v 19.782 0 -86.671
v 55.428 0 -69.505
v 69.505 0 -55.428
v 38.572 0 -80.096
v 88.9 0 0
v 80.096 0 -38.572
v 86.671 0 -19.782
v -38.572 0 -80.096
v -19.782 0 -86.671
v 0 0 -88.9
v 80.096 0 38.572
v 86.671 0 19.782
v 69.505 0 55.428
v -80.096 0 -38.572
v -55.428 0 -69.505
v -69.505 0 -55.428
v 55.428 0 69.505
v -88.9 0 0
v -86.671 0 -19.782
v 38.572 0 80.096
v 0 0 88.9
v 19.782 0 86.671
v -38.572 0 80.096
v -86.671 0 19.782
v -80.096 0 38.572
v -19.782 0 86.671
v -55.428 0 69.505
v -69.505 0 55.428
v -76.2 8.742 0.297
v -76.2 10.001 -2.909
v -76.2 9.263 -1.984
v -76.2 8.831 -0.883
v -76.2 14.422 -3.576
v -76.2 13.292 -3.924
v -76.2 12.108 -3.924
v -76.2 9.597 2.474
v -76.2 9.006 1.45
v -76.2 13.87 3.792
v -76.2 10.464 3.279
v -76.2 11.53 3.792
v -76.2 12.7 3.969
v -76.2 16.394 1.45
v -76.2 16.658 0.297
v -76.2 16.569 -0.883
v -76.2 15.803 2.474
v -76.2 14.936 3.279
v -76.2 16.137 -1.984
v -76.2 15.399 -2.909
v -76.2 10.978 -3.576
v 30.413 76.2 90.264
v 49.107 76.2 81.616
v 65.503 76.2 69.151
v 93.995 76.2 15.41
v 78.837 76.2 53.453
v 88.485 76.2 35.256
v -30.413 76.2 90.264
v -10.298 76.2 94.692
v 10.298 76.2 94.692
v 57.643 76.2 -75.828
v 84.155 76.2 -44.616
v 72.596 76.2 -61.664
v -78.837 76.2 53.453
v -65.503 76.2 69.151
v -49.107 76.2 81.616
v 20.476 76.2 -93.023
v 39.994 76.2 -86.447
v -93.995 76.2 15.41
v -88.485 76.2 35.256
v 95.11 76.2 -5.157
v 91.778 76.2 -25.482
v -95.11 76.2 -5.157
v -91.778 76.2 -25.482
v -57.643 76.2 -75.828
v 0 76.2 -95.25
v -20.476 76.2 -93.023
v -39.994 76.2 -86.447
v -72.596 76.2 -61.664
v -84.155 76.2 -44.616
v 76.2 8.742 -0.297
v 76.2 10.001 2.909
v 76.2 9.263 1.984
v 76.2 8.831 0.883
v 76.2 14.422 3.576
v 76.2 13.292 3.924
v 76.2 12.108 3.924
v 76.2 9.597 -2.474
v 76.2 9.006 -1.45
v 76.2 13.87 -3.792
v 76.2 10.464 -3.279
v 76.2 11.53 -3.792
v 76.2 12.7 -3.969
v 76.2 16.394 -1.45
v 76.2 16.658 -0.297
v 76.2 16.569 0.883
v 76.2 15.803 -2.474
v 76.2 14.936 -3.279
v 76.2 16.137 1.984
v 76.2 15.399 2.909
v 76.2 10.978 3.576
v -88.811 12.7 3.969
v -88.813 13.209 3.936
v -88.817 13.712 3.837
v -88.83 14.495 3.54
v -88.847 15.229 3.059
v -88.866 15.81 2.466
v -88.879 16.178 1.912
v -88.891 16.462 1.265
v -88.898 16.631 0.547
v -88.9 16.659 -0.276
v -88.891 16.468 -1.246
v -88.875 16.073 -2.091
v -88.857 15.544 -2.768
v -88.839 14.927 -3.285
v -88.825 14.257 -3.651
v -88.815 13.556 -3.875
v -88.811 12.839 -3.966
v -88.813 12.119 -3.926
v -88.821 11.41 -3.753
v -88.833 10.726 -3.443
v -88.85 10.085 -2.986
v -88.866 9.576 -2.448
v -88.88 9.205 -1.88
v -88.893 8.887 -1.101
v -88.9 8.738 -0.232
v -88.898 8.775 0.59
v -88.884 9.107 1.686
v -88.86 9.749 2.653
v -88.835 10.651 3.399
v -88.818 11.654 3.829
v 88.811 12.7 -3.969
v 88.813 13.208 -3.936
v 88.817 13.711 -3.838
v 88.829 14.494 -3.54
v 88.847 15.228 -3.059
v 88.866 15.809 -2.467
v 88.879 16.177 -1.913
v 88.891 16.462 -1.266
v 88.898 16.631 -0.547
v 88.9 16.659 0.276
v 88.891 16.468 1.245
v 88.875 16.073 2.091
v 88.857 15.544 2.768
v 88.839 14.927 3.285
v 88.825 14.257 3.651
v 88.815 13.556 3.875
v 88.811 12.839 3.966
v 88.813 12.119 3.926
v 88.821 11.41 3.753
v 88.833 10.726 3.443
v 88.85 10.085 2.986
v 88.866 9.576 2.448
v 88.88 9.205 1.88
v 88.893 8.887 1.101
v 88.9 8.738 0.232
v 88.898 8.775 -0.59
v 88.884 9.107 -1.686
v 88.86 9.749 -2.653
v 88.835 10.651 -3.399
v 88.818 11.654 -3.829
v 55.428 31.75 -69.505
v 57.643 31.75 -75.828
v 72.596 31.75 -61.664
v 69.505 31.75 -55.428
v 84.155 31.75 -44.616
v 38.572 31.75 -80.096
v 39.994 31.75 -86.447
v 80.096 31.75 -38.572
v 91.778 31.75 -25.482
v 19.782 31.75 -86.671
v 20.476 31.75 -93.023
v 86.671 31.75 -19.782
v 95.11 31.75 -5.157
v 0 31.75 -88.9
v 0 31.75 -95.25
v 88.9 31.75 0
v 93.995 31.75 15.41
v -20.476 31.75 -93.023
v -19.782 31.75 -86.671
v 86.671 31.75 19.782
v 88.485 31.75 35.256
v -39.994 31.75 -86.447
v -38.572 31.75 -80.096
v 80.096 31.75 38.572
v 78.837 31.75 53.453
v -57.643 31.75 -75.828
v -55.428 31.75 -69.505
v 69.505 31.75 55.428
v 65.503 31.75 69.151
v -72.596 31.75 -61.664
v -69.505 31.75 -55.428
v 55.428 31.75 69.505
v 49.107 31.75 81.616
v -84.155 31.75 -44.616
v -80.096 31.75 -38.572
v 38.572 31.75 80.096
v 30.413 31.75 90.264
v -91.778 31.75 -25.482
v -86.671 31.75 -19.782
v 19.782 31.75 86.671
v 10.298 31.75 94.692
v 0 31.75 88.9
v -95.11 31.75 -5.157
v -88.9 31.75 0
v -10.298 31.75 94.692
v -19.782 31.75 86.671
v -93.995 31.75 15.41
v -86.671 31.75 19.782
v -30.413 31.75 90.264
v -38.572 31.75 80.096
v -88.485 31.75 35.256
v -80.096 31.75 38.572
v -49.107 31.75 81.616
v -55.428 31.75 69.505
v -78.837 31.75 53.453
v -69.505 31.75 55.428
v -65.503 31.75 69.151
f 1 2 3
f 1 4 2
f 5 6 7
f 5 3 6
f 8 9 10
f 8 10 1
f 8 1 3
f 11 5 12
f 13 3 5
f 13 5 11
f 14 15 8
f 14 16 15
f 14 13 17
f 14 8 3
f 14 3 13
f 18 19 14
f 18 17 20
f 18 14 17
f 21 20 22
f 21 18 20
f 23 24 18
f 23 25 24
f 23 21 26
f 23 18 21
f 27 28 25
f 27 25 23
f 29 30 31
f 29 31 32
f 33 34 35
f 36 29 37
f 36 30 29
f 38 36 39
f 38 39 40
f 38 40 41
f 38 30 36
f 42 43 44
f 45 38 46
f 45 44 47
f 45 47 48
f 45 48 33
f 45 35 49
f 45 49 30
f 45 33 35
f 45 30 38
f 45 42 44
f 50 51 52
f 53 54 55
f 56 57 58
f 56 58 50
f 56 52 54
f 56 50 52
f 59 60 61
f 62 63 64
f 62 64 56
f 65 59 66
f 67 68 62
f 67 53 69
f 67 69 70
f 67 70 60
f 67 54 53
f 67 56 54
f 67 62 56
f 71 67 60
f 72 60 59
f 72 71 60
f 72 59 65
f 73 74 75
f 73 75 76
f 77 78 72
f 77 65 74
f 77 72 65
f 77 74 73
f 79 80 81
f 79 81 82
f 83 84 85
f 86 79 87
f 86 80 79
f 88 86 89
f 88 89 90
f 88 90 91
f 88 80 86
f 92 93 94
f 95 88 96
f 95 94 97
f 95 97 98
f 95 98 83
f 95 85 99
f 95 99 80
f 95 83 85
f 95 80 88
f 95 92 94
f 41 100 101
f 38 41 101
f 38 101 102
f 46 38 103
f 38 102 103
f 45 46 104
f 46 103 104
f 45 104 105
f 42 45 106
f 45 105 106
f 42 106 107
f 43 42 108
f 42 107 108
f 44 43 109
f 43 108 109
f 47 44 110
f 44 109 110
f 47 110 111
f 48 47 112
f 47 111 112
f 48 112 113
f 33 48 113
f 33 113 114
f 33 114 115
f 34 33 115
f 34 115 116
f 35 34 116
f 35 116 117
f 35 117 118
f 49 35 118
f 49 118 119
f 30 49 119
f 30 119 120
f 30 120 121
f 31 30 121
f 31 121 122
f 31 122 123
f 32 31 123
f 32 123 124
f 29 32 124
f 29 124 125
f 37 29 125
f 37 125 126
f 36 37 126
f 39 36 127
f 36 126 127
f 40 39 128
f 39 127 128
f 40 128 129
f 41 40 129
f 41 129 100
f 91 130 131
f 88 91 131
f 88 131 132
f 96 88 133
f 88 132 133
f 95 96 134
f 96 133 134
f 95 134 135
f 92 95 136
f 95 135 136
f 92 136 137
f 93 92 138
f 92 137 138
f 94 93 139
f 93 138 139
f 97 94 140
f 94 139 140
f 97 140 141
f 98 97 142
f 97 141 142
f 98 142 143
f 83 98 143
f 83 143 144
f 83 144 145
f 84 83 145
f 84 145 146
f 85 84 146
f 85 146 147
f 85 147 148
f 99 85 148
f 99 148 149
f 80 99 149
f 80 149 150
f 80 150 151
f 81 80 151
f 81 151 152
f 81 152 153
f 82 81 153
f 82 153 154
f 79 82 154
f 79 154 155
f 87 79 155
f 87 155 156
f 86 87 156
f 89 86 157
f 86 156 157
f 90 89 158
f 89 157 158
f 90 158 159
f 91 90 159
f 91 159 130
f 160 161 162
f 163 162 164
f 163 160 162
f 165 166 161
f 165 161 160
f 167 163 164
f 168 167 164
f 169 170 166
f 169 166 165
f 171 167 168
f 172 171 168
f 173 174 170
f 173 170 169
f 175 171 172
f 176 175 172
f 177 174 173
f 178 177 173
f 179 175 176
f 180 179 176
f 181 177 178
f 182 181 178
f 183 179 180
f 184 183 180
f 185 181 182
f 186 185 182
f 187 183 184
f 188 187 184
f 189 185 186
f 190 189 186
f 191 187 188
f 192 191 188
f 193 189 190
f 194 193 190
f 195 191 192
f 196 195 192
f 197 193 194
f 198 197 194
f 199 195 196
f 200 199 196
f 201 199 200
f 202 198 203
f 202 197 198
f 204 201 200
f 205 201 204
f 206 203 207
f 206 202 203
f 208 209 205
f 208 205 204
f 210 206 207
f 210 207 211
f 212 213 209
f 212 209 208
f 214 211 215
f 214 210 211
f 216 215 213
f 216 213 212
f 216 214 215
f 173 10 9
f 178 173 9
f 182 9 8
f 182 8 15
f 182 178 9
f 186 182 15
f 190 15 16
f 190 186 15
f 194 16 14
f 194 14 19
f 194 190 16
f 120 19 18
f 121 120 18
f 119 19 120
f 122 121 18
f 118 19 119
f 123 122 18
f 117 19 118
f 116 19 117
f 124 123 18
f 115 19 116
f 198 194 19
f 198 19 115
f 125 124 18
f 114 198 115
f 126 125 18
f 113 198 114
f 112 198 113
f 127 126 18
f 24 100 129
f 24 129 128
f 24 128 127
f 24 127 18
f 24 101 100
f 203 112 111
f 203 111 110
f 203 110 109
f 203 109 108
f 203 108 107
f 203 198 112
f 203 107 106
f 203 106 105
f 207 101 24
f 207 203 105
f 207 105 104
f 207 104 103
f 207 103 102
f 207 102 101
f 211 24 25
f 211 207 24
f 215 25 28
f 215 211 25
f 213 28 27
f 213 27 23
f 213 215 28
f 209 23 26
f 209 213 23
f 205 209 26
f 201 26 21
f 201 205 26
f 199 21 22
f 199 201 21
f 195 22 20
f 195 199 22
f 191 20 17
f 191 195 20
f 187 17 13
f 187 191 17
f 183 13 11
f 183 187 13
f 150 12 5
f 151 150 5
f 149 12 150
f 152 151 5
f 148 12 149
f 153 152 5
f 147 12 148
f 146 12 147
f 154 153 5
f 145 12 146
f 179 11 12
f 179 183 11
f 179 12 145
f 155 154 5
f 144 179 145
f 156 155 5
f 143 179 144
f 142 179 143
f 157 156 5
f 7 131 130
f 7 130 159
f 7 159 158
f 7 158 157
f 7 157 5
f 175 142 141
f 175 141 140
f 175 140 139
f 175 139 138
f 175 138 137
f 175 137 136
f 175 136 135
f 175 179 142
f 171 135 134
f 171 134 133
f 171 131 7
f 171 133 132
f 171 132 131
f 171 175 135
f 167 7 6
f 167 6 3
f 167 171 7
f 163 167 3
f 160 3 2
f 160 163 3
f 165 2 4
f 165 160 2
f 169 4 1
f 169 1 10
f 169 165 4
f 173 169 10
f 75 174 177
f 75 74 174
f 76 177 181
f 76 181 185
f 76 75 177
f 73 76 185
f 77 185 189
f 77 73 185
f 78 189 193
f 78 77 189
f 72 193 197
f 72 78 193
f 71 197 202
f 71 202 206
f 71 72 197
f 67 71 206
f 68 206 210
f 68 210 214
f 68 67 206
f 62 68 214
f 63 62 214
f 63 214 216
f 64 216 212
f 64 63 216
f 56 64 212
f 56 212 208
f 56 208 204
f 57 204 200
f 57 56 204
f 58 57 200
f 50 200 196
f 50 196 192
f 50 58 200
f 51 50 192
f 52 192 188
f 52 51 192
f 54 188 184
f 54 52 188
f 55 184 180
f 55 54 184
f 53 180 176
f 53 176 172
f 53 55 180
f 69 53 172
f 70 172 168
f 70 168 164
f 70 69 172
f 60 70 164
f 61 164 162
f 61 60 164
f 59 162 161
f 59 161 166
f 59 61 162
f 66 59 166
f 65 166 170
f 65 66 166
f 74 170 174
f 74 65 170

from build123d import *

# Parameters (mm, degrees)
SKETCH3_R          = 3.96875
CUT_EXTRUDE1_DEPTH = 12.7
CIRPATTERN2_COUNT  = 2


with BuildPart() as part:
    # Sketch1 → Revolve1 (revolve)
    with BuildSketch(Plane.XY, mode=Mode.PRIVATE) as revolve1_sk:
        Polygon((0, 0), (88.9, 0), (88.9, 31.75), (95.25, 31.75), (95.25, 76.2), (0, 76.2), align=None)
    revolve(revolve1_sk.sketch.rotate(Axis((0, 0, 0), (0, 1, 0)), 90), axis=Axis((0, 0, 0), (0, 1, 0)))

    # Sketch3 → Cut-Extrude1 (cut)
    with BuildSketch(Plane(origin=(88.9, 0, 0), x_dir=(0, 0, -1), z_dir=(1, 0, 0))):
        with Locations((0, 12.7)):
            Circle(SKETCH3_R)
    cut_extrude1 = extrude(amount=-CUT_EXTRUDE1_DEPTH, mode=Mode.SUBTRACT)

    # CirPattern2: Cut-Extrude1 ×2 about axis
    cirpattern2_axis = Axis((0, 0, 0), (0, -1, 0))
    for i in range(1, CIRPATTERN2_COUNT):
        add(cut_extrude1.rotate(cirpattern2_axis, i * 360 / CIRPATTERN2_COUNT), mode=Mode.SUBTRACT)


solid = part.part
